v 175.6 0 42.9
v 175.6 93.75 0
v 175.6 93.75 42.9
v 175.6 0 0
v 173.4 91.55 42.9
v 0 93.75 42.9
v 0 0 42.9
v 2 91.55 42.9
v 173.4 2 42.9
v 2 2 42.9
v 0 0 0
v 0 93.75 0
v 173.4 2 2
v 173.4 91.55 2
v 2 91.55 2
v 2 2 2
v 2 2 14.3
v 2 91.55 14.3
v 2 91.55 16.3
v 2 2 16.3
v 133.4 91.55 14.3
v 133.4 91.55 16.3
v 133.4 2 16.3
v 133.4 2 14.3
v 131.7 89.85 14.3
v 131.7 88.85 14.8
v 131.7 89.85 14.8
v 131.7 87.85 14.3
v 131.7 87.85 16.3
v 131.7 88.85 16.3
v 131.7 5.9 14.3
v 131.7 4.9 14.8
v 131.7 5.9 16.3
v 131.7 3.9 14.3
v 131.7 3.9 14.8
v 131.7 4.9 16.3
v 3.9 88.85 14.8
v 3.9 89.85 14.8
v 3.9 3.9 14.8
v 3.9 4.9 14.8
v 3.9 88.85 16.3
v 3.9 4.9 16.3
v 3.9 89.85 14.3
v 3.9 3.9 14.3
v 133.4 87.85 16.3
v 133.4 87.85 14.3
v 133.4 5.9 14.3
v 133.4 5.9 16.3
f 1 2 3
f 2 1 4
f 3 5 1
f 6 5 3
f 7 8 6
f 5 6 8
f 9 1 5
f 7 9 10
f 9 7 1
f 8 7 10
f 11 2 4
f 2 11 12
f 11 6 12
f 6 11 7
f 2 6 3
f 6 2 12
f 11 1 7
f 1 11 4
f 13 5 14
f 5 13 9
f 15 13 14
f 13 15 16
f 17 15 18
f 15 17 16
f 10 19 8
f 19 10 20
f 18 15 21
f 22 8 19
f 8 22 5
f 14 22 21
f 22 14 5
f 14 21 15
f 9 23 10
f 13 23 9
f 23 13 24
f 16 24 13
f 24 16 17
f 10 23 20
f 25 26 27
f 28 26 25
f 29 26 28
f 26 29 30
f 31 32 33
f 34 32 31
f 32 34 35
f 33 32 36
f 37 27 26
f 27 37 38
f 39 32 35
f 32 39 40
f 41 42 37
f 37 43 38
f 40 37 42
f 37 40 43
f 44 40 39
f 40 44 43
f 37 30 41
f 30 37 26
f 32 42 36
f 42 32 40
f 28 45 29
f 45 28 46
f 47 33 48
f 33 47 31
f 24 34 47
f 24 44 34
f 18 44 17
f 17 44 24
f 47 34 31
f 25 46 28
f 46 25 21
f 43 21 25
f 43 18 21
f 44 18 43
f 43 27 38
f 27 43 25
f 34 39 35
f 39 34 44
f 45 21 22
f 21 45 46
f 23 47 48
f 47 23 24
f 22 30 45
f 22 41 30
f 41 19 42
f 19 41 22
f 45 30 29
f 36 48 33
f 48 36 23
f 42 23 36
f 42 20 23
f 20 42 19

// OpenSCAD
$fn=100;
/* Plate dimentions
*/
p_width=127.6;
p_depth=85.75;
p_height=14.3;
A=14.3;
B=9;
C=11.36;
well_d=6.21;
well_hood=10;
well_h=11.7;
hood_th = 2; //hood wall thickness for both walls (so divide by 2)

module well() {
    cylinder(d=well_d,center=false,h=well_h);
}

module well2() {
        translate([-well_hood/2,-well_hood/2,0]){
            difference(){
                cube(well_hood,center=false);            
                translate([(+hood_th)/2,(hood_th)/2,0]){
                cube([well_hood-hood_th,well_hood-hood_th,well_hood]);
                }
            }
    }
    }


module row(){
    translate([A,C,p_height-well_h]){
        cylinder(d=well_d,center=false,h=well_h);
        translate([B,0,0]){
            well();
            translate([B,0,0]){
            well();
                translate([B,0,0]){
                well();
                    translate([B,0,0]){
                    well();
                        translate([B,0,0]){
                well();
                            translate([B,0,0]){
                well();
                                translate([B,0,0]){
                well();
                                    translate([B,0,0]){
                well();
                                        translate([B,0,0]){
                well();
                                            translate([B,0,0]){
                well();
                                                translate([B,0,0]){
                well();
                }
                }
                }
                }
                }
                }
                }
                    }
                }
            }
        }
    }
}

module row2(){
    translate([A,C,0]){
        well2();
        translate([B,0,0]){
            well2();
            translate([B,0,0]){
            well2();
                translate([B,0,0]){
                well2();
                    translate([B,0,0]){
                    well2();
                        translate([B,0,0]){
                well2();
                            translate([B,0,0]){
                well2();
                                translate([B,0,0]){
                well2();
                                    translate([B,0,0]){
                well2();
                                        translate([B,0,0]){
                well2();
                                            translate([B,0,0]){
                well2();
                                                translate([B,0,0]){
                well2();
                }
                }
                }
                }
                }
                }
                }
                    }
                }
            }
        }
    }
}

module all_wells(){
    row();
    translate([0,B,0]){
        row();
     translate([0,B,0]){
        row();
        translate([0,B,0]){
        row();
        translate([0,B,0]){
        row();
        translate([0,B,0]){
        row();
        translate([0,B,0]){
        row();
        translate([0,B,0]){
        row();
        
    }
    }
    }
    }
    }
    }   
    }
}

module all_wells2(){
    row2();
    translate([0,B,0]){
        row2();
     translate([0,B,0]){
        row2();
        translate([0,B,0]){
        row2();
        translate([0,B,0]){
        row2();
        translate([0,B,0]){
        row2();
        translate([0,B,0]){
        row2();
        translate([0,B,0]){
        row2();
        
    }
    }
    }
    }
    }
    }   
    }
}

/*plate 
*/
module plate(){
difference(){
cube([p_width,p_depth,p_height]);
    all_wells();
}
}

/*the sensors screen 
*/
module screen() {
translate([0,0,-5])
difference(){
cube([p_width,p_depth,2]);
    translate([0,0,-4])
    all_wells();
}
}

/*the lower case*/
wall_th= 2;
rim_th = 2;
side_box_width=40;
connection_hole_y=20;
connection_hole_z=15;
finger_holes_d=45;
finger_holes_z=15;

module lower_c(){
translate([0,0,-50]){
    union(){
        difference(){
            cube([p_width+(2*wall_th),p_depth+(2*wall_th),p_height*3]);//outer case
            translate([wall_th,wall_th,2*p_height-2]){
                cube([p_width,p_depth,p_height+2]); //upper part/
            }
            translate([wall_th+2,wall_th+2,wall_th,]){
                cube([p_width-4,p_depth-4 ,2*p_height]);//lower part
            }
            translate([p_width-2,connection_hole_y,wall_th]){ //the hole for the connection cables
            cube([10,p_depth+2*wall_th-2*connection_hole_y,connection_hole_z]);
            }
            translate([0,(p_depth+(2*wall_th))/2,3*p_height+finger_holes_z]){
                rotate([0,90,0])
            cylinder(d=finger_holes_d,h=wall_th,center=false);
            }
            translate([p_width+wall_th,(p_depth+(2*wall_th))/2,3*p_height+finger_holes_z]){
                rotate([0,90,0])
            cylinder(d=finger_holes_d,h=wall_th,center=false);
            }
        }
        translate([p_width+2*wall_th,0,0]){ //the side box
            difference(){
                cube([side_box_width,p_depth+2*wall_th,3*p_height]); //outer
                translate([0,wall_th,wall_th])
                cube([side_box_width-wall_th,p_depth,3*p_height-wall_th]); //inner
            }
        }
        translate([-2,-2,2*p_height]){
            difference(){
                cube([p_width+side_box_width+2*rim_th+2*wall_th,p_depth+2*wall_th+2*rim_th,rim_th]);//the rim
                translate([rim_th,rim_th,0]){ //inner hole in the rim     
                    cube([p_width+side_box_width+2*wall_th,p_depth+2*wall_th,rim_th]);
                }
            }
        }
    }
}
}

//The LEDs grid

module leds_grid(){
    union(){
        translate([0,0,5])
        screen();
        all_wells2();
    }
}

//The upper lid
offset=0.1;
slide=1;
outer_dim_x =p_width+                               //outer x dimention of the lid
                            side_box_width+
                            2*rim_th+
                            2*wall_th;  
outer_dim_y =p_depth+
                            2*wall_th+
                            2*rim_th;
inside_dim_x=outer_dim_x-
                            2*rim_th-
                            2*offset;
inside_dim_y=outer_dim_y-
                            2*rim_th-
                            2*offset;
slide_out_x=inside_dim_x-
                        side_box_width; // tthis is the main cube for the slide
slide_out_y=inside_dim_y;
                        
module upper_c(){
    difference(){
        cube([outer_dim_x,outer_dim_y,3*p_height]);//outer dimention of the lid
        translate([rim_th,rim_th,wall_th]) //move inside for the length of rim
        cube([inside_dim_x,inside_dim_y,3*p_height]);//inner dimention of the lid 
    }
    translate([wall_th,wall_th,p_height]){ //move inside the rim and plot the body
        difference(){
            cube([slide_out_x,slide_out_y,2]);//main body
            translate([rim_th-offset,rim_th-offset,0]){ //moved inside the walls and to the roof
                cube([p_width+2*offset,p_depth+2*offset,0.5]); //cuts the hole for the plate
                translate([0,slide,0.5]){//hole leaving the slides
                cube([p_width+2*offset,p_depth-2*slide+2*offset,2]);
                    translate([0,slide,-3])//destroy the bridge and leave tiny bits on sides = slides to fix plate
                    cube([p_width+2*offset+2,p_depth+2*offset-4*slide,5]);
                }
            
        }
        }
    }
}

screen();
lower_c();
translate([-rim_th,2*rim_th+wall_th+p_depth,17]){
rotate([180,0,0]){
    !upper_c();
    translate([rim_th+wall_th,rim_th+wall_th,p_height])
    leds_grid();
}
}
